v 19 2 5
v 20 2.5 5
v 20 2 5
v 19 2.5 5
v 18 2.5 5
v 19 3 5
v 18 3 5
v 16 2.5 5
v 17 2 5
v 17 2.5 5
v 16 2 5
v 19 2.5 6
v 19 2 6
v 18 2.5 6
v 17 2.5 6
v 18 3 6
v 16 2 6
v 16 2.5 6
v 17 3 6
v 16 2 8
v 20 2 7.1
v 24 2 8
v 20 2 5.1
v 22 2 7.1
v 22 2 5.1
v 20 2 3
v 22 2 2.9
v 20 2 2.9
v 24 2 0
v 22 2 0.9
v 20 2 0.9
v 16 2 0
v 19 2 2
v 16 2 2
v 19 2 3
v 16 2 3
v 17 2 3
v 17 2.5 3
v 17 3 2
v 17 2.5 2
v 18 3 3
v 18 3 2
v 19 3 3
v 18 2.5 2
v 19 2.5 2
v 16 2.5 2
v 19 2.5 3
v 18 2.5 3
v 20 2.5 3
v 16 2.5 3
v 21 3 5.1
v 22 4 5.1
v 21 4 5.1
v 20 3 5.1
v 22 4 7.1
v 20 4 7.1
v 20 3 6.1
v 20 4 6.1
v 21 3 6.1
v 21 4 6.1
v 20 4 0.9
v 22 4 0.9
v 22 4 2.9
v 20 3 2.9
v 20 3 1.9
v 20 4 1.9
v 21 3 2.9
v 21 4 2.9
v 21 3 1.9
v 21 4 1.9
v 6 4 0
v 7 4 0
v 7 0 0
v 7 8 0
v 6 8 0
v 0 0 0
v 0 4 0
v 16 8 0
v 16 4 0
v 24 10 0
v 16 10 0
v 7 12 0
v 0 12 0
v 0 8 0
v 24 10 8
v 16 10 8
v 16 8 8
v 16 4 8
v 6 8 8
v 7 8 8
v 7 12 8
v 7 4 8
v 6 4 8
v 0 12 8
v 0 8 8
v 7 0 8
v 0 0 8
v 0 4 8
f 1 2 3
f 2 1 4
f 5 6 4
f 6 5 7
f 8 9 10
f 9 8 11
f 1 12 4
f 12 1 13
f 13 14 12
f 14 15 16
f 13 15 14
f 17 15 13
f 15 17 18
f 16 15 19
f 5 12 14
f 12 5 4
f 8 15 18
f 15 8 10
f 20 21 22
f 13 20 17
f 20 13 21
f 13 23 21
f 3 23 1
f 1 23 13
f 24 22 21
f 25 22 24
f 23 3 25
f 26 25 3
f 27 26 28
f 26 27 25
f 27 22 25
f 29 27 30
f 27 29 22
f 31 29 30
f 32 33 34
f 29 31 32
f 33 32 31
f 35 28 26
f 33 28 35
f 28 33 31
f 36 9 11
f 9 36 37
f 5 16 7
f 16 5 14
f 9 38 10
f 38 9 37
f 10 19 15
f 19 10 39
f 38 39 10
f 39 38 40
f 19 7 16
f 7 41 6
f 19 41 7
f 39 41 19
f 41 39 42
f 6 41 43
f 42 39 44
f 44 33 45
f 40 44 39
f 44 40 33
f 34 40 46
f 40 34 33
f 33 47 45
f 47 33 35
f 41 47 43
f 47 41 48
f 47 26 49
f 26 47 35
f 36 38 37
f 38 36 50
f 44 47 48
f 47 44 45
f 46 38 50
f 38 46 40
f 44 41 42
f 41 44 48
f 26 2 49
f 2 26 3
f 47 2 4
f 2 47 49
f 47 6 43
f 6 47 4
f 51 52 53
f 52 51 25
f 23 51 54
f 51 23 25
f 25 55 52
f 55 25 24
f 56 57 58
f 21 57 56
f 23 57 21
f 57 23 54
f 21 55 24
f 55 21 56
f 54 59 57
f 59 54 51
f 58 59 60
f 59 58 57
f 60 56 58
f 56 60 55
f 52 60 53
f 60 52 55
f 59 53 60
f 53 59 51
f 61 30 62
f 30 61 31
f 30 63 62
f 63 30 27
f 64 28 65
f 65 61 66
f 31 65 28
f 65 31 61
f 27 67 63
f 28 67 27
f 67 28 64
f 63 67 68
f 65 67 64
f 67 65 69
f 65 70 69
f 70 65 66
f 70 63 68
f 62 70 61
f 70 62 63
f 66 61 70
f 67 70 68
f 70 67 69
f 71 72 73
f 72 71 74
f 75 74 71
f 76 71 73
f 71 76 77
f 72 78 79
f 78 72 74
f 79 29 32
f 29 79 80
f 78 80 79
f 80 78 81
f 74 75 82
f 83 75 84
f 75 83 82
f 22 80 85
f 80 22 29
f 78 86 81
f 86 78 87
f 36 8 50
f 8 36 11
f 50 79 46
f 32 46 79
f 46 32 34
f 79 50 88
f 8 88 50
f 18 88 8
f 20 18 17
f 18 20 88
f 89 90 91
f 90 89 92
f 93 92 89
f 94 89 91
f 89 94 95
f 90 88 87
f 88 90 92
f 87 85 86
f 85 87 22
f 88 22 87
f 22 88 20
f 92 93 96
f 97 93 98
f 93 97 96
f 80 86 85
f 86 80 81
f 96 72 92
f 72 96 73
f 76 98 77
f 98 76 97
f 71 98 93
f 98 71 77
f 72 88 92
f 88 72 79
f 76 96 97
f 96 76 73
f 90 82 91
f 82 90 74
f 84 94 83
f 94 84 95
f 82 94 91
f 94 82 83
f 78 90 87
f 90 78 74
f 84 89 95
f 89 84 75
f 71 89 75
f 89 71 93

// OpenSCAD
// [FL_INDEX: keywords="openscad, 3d_parametric, Parametric_Minecraft_Creeper_-_Now_With_Dualstrusion, csg_solid" | COT="Parametric OpenSCAD design from 3DCodeverse"]
// Title: Parametric Minecraft Creeper - Now With Dualstrusion!

//Dualstrusion or regular?
part = "first"; //[first:Body (regular),second:Body (dualstrusion),third:Face(dualstrusion)]

//Pixel size in millimeters
pixel_size = 1;

scale(pixel_size)
{
//make it on its side
translate([0,0,8]) rotate([0,90,0])
{

if(part == "first")
{
union()
{
//legs
cube([8,4,6 + 1]);
translate([0,8,0]) cube([8,4,6 + 1]);
//body
translate([0,4,6]) cube([8,4,12]);
//head
//translate([0,2,16]) cube(8);
//eyes + mouth
difference()
{
translate([0,2,16]) cube(8);

union()
{
//mouth
translate([2,2,16 - 0.1]) cube([1,0.5,3 + 0.1]);
translate([2,2,17]) cube(1);
translate([5,2,16 - 0.1]) cube([1,0.5,3 + 0.1]);
translate([5,2,17]) cube(1);
translate([3,2,17]) cube([2,0.5,3]);
translate([3,2,17]) cube([2,1,2]);
//left eye
translate([1 - 0.1,2,20]) cube([2,1,2]);
translate([1 - 0.1,2,20]) cube([1,2,2]);
translate([2 - 0.1,2,21]) cube([1,2,1]);
//right eye
translate([5 + 0.1,2,20]) cube([2,1,2]);
translate([6 + 0.1,2,20]) cube([1,2,2]);
translate([5 + 0.1,2,21]) cube([1,2,1]);
}
}
}
}
else if (part == "second")
{
union()
{
//legs
cube([8,4,6 + 1]);
translate([0,8,0]) cube([8,4,6 + 1]);
//body
translate([0,4,6]) cube([8,4,12]);
//head
//translate([0,2,16]) cube(8);

//eyes + mouth
difference()
{
translate([0,2,16]) cube(8);

union()
{
//mouth
translate([2,2,16 - 0.1]) cube([1,1,3 + 0.1]);
translate([5,2,16 - 0.1]) cube([1,1,3 + 0.1]);
translate([3,2,17]) cube([2,1,3]);
//left eye
translate([1 - 0.1,1,20]) cube([1,2,2]);
translate([2 - 0.1,1,21]) cube([1,2,1]);
//right eye
translate([6 + 0.1,1,20]) cube([1,2,2]);
translate([5 + 0.1,1,21]) cube([1,2,1]);
}
}
}
}
else if (part == "third")
{
union()
{
//mouth
translate([2,2,16 - 0.1]) cube([1,1,3 + 0.1]);
translate([5,2,16 - 0.1]) cube([1,1,3 + 0.1]);
translate([3,2,17]) cube([2,1,3]);
//left eye
translate([1 - 0.1,2,20]) cube([1,1,2]);
translate([2 - 0.1,2,21]) cube([1,1,1]);
//right eye
translate([6 + 0.1,2,20]) cube([1,1,2]);
translate([5 + 0.1,2,21]) cube([1,1,1]);
}
}

}
}
